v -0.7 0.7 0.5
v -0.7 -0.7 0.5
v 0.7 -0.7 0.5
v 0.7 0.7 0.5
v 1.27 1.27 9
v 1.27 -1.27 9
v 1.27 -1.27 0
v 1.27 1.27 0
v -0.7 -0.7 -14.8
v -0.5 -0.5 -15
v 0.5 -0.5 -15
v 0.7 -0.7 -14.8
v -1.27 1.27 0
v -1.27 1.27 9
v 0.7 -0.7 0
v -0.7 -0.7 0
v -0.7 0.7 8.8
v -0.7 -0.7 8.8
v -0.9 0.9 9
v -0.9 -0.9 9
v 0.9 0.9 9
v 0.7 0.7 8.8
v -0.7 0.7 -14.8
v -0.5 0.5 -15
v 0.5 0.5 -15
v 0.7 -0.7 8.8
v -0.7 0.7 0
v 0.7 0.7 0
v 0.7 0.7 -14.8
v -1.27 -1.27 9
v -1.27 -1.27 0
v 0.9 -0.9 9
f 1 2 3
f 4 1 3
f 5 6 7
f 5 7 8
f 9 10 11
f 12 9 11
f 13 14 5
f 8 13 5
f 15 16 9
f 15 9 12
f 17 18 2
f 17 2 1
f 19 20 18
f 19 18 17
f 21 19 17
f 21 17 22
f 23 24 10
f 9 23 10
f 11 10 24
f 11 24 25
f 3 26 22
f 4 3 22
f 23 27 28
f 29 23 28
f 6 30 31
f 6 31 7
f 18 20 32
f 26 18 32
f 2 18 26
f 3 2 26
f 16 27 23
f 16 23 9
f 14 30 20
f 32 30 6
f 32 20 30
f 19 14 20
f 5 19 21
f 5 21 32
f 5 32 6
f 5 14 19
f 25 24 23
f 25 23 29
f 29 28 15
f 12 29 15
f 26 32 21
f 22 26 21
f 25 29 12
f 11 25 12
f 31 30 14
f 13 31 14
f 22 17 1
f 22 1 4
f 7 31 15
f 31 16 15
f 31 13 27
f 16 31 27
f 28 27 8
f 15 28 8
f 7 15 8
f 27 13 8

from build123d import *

# Parameters (mm, degrees)
F0_W     = 2.54
F0_H     = 2.54
F0_W_2   = 1.4
F0_H_2   = 1.4
F1_DEPTH = 9
F2_SIZE  = 0.2
F3_W     = 1.4
F3_H     = 1.4
F4_DEPTH = 15
F5_SIZE  = 0.2
F6_DEPTH = 0.5


with BuildPart() as f1:
    # F0 (on Top) → F1 (new body)
    with BuildSketch(Plane.XY):
        Rectangle(F0_W, F0_H)
        Rectangle(F0_W_2, F0_H_2, mode=Mode.SUBTRACT)
    extrude(amount=F1_DEPTH)

    # F2
    f2_edges = [f1.edges().sort_by_distance(p)[0] for p in [
        (0, -0.7, 9),
        (-0.7, 0, 9),
        (0, 0.7, 9),
        (0.7, 0, 9),
    ]]
    chamfer(f2_edges, length=F2_SIZE)

    # F3 (on face) → F4 (join)
    with BuildSketch(Plane(origin=(0, 0, 0), x_dir=(1, 0, 0), z_dir=(0, 0, -1))):
        Rectangle(F3_W, F3_H)
    extrude(amount=F4_DEPTH)

    # F5
    f5_edges = [f1.edges().sort_by_distance(p)[0] for p in [
        (-0.7, 0, -15),
        (0, 0.7, -15),
        (0.7, 0, -15),
        (0, -0.7, -15),
    ]]
    chamfer(f5_edges, length=F5_SIZE)

    # F6 (add): a face of the model
    f6_faces = [f1.faces().sort_by_distance(p)[0] for p in [
        (0, 0, 0),
    ]]
    extrude(f6_faces, amount=F6_DEPTH)


solid = f1.part
